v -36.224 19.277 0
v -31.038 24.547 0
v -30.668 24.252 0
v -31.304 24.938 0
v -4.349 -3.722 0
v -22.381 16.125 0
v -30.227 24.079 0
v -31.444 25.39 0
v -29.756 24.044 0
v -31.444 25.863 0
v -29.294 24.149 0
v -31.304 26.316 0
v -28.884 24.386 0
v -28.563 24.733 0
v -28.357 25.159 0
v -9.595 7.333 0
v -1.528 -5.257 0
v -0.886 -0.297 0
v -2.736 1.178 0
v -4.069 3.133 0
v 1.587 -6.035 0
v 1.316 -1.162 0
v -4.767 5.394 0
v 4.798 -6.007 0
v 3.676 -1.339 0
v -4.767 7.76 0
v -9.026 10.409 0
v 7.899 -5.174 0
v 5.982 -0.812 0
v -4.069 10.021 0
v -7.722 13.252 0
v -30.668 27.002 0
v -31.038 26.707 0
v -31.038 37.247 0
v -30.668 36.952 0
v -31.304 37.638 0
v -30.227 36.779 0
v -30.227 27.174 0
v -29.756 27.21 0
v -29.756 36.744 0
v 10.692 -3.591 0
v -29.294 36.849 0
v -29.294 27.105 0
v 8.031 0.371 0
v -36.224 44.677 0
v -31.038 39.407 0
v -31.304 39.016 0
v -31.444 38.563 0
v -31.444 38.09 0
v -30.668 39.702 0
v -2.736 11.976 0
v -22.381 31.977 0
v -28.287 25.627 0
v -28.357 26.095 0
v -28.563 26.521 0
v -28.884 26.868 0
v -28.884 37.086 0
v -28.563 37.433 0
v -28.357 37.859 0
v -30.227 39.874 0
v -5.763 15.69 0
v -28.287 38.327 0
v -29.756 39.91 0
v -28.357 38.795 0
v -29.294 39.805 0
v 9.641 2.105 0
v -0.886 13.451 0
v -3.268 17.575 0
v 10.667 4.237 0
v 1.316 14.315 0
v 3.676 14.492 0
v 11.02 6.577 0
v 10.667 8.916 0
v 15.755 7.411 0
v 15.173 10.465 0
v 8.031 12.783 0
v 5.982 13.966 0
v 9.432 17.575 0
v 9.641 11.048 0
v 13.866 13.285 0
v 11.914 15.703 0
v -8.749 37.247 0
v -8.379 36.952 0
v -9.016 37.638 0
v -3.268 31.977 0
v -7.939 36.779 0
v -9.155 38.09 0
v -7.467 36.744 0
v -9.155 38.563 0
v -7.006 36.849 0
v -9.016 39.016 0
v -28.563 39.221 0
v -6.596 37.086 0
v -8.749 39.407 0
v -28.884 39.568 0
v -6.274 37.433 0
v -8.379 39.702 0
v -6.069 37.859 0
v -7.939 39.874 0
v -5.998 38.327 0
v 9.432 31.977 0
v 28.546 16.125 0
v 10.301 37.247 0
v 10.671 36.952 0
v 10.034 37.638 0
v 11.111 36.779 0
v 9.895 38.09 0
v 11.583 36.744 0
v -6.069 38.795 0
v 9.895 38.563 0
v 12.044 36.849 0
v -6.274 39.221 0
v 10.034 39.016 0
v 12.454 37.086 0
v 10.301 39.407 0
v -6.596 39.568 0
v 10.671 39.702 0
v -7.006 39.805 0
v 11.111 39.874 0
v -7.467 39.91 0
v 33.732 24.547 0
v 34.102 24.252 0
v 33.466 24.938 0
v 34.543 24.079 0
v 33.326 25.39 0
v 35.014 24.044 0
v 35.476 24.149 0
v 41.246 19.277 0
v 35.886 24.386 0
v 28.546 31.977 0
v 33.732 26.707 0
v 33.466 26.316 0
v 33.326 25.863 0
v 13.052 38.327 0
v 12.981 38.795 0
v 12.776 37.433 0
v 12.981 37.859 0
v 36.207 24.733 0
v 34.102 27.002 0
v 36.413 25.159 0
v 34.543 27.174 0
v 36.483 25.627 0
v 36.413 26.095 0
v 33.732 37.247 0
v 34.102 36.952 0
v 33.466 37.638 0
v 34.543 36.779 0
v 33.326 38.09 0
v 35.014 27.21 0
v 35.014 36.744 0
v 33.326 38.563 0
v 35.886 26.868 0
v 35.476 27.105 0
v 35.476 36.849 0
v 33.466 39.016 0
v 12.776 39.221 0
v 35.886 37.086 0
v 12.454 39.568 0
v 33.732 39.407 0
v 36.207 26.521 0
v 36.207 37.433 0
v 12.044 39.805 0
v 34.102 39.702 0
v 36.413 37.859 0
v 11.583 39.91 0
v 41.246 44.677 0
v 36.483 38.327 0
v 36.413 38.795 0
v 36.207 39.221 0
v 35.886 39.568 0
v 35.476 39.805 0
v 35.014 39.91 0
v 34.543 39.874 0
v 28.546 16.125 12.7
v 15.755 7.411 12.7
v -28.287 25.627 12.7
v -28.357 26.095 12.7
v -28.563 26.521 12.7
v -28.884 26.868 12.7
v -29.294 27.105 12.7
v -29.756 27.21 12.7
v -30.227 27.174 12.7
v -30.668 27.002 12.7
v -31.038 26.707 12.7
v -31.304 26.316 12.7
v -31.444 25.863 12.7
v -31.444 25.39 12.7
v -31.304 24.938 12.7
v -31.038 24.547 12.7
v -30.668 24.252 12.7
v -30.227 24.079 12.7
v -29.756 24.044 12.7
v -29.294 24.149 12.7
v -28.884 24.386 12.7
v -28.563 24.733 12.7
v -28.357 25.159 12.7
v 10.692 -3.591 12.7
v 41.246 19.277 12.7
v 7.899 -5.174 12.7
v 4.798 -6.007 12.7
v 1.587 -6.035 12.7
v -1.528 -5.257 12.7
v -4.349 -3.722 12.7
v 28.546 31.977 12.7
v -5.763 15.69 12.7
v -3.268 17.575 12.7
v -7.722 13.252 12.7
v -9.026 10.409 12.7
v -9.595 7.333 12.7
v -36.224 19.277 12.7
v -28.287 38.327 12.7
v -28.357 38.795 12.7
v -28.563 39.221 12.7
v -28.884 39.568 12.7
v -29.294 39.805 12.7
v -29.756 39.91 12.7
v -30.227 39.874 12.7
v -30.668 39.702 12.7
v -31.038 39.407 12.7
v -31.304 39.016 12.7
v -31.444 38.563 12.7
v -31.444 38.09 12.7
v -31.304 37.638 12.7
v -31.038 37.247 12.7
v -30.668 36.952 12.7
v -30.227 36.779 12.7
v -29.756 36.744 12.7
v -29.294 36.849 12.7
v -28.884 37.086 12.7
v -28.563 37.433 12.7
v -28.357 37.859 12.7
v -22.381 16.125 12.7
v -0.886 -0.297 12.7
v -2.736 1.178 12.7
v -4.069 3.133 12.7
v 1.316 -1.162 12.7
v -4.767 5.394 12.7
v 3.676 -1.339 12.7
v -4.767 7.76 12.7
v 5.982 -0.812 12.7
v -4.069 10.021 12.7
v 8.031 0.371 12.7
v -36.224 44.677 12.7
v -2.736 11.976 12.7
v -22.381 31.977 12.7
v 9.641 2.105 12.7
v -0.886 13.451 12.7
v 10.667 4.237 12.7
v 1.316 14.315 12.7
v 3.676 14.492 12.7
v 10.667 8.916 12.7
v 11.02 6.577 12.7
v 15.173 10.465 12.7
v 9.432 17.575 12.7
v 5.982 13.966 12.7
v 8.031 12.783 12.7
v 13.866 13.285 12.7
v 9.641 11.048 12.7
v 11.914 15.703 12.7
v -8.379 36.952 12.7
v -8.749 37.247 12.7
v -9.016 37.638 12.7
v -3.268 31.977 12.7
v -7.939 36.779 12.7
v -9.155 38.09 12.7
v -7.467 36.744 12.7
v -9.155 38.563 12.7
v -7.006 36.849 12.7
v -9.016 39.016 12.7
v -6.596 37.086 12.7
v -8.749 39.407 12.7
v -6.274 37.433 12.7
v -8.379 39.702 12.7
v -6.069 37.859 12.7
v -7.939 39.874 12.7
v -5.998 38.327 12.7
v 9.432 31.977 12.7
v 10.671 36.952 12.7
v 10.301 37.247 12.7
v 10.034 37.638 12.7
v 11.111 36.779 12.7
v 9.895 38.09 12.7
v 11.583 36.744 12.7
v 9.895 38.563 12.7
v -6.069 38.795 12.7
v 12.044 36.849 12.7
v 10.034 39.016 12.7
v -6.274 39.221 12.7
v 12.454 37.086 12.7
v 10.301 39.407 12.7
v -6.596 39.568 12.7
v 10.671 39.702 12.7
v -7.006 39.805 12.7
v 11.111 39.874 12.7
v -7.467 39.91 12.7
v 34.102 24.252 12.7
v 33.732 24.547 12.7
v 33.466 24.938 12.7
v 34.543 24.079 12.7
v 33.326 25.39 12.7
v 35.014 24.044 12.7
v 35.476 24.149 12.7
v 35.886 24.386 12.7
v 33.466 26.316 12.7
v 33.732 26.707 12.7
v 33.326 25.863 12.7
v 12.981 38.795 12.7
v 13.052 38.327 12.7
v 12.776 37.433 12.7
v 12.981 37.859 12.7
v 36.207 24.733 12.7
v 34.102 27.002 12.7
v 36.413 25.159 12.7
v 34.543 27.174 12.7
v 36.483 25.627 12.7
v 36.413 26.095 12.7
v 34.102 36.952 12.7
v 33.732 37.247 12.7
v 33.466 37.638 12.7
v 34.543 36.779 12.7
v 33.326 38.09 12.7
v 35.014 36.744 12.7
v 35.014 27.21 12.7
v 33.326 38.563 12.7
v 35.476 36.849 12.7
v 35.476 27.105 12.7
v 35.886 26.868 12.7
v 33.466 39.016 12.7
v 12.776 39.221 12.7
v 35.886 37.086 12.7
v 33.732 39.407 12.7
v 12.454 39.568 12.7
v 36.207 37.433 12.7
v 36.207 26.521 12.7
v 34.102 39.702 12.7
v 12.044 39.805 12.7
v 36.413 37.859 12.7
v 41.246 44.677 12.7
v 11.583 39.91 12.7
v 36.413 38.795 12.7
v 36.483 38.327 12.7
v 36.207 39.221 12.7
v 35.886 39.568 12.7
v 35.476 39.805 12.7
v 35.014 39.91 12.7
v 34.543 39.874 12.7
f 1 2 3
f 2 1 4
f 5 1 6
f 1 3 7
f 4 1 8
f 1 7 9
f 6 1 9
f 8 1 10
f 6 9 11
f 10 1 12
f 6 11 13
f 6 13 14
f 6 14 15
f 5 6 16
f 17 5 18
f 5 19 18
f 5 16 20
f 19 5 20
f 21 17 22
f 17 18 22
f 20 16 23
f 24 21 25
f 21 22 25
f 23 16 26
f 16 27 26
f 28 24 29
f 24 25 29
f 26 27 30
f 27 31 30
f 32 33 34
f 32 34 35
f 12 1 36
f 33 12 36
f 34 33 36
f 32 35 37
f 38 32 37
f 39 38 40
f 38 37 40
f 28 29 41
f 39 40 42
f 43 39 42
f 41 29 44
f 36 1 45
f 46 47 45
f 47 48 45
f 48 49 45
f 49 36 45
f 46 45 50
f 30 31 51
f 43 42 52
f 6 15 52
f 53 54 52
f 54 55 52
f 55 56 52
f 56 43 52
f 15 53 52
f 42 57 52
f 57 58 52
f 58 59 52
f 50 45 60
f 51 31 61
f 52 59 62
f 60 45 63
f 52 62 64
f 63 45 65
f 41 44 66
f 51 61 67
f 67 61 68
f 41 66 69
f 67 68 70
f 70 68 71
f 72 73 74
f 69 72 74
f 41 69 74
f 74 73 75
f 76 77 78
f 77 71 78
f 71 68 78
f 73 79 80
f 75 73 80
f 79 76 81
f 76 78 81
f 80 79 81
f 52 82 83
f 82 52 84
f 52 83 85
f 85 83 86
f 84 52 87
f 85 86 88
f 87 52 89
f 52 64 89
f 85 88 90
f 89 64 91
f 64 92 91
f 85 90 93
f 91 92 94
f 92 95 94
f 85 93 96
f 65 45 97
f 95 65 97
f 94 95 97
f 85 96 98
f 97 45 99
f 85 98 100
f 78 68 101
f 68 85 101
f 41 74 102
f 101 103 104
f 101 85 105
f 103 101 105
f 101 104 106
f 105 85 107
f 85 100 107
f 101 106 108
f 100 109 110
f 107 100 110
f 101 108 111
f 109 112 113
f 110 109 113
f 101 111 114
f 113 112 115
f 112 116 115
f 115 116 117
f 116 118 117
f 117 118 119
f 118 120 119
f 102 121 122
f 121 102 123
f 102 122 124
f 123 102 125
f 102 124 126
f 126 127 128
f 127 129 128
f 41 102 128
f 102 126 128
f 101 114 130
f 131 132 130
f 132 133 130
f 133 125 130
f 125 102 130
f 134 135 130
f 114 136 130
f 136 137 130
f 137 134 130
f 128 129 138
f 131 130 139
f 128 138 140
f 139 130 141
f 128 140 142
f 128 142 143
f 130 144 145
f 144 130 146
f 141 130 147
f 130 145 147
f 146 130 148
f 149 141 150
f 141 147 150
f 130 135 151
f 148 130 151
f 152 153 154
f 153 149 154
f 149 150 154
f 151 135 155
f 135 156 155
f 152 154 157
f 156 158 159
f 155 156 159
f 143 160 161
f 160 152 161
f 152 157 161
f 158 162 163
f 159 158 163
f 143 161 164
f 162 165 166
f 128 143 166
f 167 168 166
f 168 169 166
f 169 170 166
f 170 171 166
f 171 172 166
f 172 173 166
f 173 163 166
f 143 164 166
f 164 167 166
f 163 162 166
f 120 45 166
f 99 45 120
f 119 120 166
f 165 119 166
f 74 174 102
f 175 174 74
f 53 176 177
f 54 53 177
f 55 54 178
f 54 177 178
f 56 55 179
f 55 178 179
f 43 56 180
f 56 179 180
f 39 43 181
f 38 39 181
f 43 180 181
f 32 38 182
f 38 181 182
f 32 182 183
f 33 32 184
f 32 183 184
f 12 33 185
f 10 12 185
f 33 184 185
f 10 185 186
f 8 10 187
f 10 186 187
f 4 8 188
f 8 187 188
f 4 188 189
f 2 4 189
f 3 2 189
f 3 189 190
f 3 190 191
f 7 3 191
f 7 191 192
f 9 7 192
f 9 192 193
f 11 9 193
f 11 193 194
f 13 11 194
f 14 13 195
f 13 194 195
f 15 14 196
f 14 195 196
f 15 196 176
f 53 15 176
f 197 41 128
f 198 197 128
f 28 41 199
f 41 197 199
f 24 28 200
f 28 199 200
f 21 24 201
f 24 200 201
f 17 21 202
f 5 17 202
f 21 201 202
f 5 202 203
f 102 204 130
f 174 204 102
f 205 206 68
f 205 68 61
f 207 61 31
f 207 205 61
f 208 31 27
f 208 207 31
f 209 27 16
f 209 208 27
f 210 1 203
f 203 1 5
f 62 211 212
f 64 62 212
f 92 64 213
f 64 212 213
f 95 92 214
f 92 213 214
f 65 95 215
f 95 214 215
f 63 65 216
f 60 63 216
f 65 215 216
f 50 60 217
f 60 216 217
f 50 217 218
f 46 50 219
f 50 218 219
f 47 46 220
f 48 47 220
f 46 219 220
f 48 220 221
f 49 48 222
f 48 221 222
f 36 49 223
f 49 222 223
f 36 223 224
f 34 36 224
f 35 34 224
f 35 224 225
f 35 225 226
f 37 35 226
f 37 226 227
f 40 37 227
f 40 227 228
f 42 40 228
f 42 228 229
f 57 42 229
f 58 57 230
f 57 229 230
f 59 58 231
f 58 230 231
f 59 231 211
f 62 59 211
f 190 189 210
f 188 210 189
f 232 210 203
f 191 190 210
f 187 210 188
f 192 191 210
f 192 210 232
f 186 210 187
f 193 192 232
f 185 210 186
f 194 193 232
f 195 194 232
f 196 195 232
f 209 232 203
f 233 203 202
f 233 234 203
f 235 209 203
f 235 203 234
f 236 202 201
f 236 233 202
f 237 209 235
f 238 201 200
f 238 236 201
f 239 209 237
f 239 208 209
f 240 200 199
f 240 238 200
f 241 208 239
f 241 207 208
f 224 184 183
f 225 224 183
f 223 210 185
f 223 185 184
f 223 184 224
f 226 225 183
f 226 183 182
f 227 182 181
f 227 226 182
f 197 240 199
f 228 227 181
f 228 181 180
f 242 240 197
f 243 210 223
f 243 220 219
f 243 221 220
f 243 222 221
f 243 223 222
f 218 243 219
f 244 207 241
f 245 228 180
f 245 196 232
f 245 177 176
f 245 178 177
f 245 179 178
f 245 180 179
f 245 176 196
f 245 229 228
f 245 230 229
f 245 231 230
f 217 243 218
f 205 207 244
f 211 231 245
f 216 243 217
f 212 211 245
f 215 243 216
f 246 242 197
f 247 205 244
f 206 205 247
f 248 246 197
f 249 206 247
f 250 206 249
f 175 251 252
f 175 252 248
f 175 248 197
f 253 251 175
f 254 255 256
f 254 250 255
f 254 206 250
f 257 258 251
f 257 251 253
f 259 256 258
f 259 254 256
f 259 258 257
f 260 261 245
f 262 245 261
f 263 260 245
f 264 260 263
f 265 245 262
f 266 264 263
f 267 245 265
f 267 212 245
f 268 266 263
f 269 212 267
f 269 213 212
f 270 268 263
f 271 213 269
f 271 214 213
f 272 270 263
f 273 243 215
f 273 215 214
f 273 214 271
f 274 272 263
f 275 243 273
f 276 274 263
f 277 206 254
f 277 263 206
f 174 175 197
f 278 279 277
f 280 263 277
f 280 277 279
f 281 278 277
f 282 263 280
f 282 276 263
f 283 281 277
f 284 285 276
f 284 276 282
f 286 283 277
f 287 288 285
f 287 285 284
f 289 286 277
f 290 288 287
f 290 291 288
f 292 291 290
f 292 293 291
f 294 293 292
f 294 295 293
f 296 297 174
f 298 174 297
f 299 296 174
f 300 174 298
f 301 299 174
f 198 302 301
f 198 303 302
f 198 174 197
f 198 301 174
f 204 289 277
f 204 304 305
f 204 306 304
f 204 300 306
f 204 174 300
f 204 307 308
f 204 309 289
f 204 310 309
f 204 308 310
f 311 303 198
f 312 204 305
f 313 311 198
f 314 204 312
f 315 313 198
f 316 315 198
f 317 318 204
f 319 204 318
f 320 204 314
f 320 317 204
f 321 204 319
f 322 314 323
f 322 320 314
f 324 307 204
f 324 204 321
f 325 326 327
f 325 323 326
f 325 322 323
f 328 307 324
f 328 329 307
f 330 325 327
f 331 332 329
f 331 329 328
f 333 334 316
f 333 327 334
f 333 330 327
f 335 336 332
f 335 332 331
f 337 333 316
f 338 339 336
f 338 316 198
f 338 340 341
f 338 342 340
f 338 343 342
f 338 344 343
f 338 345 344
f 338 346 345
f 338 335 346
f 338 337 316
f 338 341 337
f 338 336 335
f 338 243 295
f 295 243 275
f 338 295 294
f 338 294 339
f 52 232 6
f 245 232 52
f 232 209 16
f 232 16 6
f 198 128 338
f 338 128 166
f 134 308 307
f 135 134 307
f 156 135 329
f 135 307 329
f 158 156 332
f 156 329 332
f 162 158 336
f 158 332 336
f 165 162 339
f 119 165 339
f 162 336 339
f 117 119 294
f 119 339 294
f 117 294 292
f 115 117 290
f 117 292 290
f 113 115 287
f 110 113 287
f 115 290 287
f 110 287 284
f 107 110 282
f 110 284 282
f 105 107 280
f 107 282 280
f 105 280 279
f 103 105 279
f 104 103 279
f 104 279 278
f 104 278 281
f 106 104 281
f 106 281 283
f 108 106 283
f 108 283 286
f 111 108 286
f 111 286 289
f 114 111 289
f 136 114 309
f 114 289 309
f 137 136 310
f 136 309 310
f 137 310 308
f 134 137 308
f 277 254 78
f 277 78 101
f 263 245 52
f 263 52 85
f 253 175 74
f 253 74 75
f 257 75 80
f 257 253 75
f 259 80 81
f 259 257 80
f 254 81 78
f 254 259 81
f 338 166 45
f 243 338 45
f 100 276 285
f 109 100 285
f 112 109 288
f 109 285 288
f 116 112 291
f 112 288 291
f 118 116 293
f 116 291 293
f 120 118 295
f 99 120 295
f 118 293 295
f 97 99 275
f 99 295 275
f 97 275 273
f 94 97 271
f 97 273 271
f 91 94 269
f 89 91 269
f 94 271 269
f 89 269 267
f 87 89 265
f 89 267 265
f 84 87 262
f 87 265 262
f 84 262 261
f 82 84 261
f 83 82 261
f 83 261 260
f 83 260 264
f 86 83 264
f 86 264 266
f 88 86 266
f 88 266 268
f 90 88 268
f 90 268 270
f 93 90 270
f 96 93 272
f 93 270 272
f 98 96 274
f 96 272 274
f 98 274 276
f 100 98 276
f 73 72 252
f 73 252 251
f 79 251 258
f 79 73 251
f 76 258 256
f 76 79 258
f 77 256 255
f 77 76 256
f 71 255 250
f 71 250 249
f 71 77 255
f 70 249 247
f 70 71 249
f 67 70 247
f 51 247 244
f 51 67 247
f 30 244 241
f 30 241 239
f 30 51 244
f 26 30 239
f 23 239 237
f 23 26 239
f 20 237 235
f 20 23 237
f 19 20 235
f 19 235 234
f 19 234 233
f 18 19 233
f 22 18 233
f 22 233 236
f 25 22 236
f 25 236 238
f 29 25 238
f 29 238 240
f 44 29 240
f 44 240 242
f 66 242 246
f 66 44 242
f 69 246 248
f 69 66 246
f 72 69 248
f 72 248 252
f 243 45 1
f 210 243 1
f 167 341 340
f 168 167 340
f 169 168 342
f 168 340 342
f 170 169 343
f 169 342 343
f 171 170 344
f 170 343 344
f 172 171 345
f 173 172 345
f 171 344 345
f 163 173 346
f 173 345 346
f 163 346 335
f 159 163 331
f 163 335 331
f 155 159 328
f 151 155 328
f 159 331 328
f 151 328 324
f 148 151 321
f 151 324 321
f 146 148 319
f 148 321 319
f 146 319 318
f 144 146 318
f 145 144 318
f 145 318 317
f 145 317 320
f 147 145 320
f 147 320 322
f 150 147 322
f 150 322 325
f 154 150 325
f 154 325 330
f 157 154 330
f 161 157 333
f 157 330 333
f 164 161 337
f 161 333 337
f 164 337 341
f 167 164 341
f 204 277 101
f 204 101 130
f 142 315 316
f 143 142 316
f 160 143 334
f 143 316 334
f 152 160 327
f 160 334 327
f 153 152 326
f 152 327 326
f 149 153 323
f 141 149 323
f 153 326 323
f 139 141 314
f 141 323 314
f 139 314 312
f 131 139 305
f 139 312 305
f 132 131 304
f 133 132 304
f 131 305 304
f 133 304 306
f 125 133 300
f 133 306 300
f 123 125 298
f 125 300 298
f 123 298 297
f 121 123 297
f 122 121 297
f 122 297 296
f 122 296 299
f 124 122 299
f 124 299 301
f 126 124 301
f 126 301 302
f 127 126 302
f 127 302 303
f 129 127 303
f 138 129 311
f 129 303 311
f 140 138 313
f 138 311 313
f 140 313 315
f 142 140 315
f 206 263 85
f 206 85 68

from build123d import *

# Parameters (mm, degrees)
SKETCH1_R           = 7.9375
BOSS_EXTRUDE1_DEPTH = 12.7
SKETCH2_R           = 1.5875
CUT_EXTRUDE1_DEPTH  = 12.7
CUT_EXTRUDE2_DEPTH  = 15.24
FILLET1_R           = 12.7


with BuildPart() as part:
    # Sketch1 → Boss-Extrude1 (new body)
    with BuildSketch(Plane.XY):
        Polygon((41.245841837, 19.276785714), (41.245841837, 44.676785714), (-36.224158163, 44.676785714), (-36.224158163, 19.276785714), (3.2200448, -9.183280125), align=None)
        with Locations((3.082341837, 6.576785714)):
            Circle(SKETCH1_R, mode=Mode.SUBTRACT)
    extrude(amount=BOSS_EXTRUDE1_DEPTH)

    # Sketch2 → Cut-Extrude1 (cut)
    with BuildSketch(Plane.XY.offset(12.7)):
        with Locations((-29.874158163, 38.326785714)):
            Circle(SKETCH2_R)
        with Locations((-29.874158163, 25.626785714)):
            Circle(SKETCH2_R)
        with Locations((34.895841837, 38.326785714)):
            Circle(SKETCH2_R)
        with Locations((34.895841837, 25.626785714)):
            Circle(SKETCH2_R)
        with Locations((-7.585658163, 38.326785714)):
            Circle(SKETCH2_R)
        with Locations((11.464341837, 38.326785714)):
            Circle(SKETCH2_R)
    extrude(amount=-CUT_EXTRUDE1_DEPTH, mode=Mode.SUBTRACT)

    # Sketch3 → Cut-Extrude2 (cut)
    with BuildSketch(Plane.XY.offset(12.7)):
        with BuildLine():
            Line((-22.381158163, 31.976785714), (-3.267658163, 31.976785714))
            Line((-3.267658163, 31.976785714), (-3.267658163, 17.575308342))
            ThreePointArc((-3.267658163, 17.575308342), (-7.722098193, 13.251669657), (-9.595109212, 7.333247809))
            Line((-9.595109212, 7.333247809), (-22.381158163, 16.12545158))
            Line((-22.381158163, 16.12545158), (-22.381158163, 31.976785714))
        make_face()
        with BuildLine():
            Line((9.432341837, 17.575308342), (9.432341837, 31.976785714))
            Line((9.432341837, 31.976785714), (28.545841837, 31.976785714))
            Line((28.545841837, 31.976785714), (28.545841837, 16.12545158))
            Line((28.545841837, 16.12545158), (15.754893995, 7.41130462))
            ThreePointArc((15.754893995, 7.41130462), (13.866177683, 13.284906497), (9.432341837, 17.575308342))
        make_face()
    extrude(amount=-CUT_EXTRUDE2_DEPTH, mode=Mode.SUBTRACT)

    # Fillet1
    fillet1_edges = [part.edges().sort_by_distance(p)[0] for p in [
        (3.2200448, -9.183280125, 6.35),
    ]]
    fillet(fillet1_edges, radius=FILLET1_R)


solid = part.part
